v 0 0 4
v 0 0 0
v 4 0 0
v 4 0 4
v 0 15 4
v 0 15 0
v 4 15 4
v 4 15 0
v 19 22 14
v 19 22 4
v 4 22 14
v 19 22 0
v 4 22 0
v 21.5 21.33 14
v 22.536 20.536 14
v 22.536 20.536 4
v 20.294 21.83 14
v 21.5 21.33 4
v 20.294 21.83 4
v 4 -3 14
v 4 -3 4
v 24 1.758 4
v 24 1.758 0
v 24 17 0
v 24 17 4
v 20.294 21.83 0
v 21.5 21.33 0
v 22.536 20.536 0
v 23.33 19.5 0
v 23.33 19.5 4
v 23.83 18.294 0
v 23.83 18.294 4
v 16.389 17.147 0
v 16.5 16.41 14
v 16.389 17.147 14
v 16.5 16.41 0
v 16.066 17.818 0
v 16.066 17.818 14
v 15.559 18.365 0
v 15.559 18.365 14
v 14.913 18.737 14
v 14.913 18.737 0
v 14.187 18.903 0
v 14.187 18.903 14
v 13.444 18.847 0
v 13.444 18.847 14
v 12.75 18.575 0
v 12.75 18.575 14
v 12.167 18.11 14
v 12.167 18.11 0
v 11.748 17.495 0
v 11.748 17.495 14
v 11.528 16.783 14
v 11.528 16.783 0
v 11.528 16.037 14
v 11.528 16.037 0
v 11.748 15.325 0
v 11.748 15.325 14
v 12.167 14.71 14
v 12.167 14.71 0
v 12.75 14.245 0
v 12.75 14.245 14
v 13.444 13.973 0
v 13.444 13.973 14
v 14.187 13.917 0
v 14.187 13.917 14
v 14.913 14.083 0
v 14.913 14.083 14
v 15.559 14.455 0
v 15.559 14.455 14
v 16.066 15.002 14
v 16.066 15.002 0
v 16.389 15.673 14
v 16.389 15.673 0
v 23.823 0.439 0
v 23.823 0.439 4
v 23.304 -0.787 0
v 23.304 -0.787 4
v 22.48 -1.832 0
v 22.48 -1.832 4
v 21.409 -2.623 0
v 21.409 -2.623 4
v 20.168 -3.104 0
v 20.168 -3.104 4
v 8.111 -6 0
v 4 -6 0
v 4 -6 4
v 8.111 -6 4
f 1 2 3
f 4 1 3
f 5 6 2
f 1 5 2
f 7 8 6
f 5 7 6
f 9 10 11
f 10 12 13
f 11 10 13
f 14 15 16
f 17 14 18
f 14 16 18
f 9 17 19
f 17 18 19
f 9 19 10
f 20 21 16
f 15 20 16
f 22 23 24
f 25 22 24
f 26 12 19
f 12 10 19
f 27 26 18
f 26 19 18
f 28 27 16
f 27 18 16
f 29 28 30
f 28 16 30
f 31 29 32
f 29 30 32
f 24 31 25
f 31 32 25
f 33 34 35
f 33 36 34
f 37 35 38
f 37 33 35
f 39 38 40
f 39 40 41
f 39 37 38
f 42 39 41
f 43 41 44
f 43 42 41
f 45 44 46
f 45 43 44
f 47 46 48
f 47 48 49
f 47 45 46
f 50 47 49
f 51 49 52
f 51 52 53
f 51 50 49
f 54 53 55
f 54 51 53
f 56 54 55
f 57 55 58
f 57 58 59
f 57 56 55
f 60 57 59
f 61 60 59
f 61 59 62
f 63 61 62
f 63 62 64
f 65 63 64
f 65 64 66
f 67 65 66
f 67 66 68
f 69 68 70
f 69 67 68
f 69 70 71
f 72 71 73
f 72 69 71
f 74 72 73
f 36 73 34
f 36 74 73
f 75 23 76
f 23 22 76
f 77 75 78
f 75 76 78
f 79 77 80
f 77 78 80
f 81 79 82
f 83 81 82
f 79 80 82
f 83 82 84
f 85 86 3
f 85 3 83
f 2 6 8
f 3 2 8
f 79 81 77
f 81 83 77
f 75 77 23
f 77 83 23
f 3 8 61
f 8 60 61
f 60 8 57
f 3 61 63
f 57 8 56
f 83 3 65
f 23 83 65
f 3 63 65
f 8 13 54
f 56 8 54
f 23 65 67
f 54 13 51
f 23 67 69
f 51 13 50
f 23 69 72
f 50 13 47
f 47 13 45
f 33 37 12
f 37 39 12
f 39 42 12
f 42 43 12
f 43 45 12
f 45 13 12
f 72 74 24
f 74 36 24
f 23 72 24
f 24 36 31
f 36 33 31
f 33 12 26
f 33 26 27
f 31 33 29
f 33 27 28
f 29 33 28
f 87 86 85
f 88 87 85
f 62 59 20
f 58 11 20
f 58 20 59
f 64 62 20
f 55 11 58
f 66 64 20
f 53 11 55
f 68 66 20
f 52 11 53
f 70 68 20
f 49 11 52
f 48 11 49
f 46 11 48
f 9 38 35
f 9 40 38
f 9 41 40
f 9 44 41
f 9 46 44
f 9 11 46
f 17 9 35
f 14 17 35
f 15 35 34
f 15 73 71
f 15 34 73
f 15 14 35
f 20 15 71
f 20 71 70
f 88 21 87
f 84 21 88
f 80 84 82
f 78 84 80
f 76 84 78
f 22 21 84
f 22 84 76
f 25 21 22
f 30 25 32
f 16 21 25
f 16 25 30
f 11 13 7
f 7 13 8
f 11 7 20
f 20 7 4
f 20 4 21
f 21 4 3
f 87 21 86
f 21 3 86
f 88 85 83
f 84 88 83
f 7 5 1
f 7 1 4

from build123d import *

# Parameters (mm, degrees)
SKETCH_1_R      = 2.5
EXTRUDE_1_DEPTH = 4
FILLET_1_R      = 5
SKETCH_2_R      = 2.5
EXTRUDE_2_DEPTH = 10


with BuildPart() as part:
    # ｽｹｯﾁ1 → ﾎﾞｽ - 押し出し1 (new body)
    with BuildSketch(Plane.XY):
        Polygon((0, 15), (0, 0), (4, 0), (4, -6), (8.110763801, -6), (24, -2.18322685), (24, 22), (4, 22), (4, 15), align=None)
        with Locations((14, 16.41)):
            Circle(SKETCH_1_R, mode=Mode.SUBTRACT)
    extrude(amount=EXTRUDE_1_DEPTH)

    # ﾌｨﾚｯﾄ1
    fillet_1_edges = [part.edges().sort_by_distance(p)[0] for p in [
        (24, 22, 2),
        (24, -2.18322685, 2),
    ]]
    fillet(fillet_1_edges, radius=FILLET_1_R)

    # ｽｹｯﾁ2 → ﾎﾞｽ - 押し出し2 (add)
    with BuildSketch(Plane.XY.offset(4)):
        with BuildLine():
            Line((4, 0), (4, -3))
            Line((4, -3), (22.535533906, 20.535533906))
            ThreePointArc((22.535533906, 20.535533906), (20.913417162, 21.619397663), (19, 22))
            Line((19, 22), (4, 22))
            Line((4, 22), (4, 15))
            Line((4, 15), (4, 0))
        make_face()
        with Locations((14, 16.41)):
            Circle(SKETCH_2_R, mode=Mode.SUBTRACT)
    extrude(amount=EXTRUDE_2_DEPTH)


solid = part.part
